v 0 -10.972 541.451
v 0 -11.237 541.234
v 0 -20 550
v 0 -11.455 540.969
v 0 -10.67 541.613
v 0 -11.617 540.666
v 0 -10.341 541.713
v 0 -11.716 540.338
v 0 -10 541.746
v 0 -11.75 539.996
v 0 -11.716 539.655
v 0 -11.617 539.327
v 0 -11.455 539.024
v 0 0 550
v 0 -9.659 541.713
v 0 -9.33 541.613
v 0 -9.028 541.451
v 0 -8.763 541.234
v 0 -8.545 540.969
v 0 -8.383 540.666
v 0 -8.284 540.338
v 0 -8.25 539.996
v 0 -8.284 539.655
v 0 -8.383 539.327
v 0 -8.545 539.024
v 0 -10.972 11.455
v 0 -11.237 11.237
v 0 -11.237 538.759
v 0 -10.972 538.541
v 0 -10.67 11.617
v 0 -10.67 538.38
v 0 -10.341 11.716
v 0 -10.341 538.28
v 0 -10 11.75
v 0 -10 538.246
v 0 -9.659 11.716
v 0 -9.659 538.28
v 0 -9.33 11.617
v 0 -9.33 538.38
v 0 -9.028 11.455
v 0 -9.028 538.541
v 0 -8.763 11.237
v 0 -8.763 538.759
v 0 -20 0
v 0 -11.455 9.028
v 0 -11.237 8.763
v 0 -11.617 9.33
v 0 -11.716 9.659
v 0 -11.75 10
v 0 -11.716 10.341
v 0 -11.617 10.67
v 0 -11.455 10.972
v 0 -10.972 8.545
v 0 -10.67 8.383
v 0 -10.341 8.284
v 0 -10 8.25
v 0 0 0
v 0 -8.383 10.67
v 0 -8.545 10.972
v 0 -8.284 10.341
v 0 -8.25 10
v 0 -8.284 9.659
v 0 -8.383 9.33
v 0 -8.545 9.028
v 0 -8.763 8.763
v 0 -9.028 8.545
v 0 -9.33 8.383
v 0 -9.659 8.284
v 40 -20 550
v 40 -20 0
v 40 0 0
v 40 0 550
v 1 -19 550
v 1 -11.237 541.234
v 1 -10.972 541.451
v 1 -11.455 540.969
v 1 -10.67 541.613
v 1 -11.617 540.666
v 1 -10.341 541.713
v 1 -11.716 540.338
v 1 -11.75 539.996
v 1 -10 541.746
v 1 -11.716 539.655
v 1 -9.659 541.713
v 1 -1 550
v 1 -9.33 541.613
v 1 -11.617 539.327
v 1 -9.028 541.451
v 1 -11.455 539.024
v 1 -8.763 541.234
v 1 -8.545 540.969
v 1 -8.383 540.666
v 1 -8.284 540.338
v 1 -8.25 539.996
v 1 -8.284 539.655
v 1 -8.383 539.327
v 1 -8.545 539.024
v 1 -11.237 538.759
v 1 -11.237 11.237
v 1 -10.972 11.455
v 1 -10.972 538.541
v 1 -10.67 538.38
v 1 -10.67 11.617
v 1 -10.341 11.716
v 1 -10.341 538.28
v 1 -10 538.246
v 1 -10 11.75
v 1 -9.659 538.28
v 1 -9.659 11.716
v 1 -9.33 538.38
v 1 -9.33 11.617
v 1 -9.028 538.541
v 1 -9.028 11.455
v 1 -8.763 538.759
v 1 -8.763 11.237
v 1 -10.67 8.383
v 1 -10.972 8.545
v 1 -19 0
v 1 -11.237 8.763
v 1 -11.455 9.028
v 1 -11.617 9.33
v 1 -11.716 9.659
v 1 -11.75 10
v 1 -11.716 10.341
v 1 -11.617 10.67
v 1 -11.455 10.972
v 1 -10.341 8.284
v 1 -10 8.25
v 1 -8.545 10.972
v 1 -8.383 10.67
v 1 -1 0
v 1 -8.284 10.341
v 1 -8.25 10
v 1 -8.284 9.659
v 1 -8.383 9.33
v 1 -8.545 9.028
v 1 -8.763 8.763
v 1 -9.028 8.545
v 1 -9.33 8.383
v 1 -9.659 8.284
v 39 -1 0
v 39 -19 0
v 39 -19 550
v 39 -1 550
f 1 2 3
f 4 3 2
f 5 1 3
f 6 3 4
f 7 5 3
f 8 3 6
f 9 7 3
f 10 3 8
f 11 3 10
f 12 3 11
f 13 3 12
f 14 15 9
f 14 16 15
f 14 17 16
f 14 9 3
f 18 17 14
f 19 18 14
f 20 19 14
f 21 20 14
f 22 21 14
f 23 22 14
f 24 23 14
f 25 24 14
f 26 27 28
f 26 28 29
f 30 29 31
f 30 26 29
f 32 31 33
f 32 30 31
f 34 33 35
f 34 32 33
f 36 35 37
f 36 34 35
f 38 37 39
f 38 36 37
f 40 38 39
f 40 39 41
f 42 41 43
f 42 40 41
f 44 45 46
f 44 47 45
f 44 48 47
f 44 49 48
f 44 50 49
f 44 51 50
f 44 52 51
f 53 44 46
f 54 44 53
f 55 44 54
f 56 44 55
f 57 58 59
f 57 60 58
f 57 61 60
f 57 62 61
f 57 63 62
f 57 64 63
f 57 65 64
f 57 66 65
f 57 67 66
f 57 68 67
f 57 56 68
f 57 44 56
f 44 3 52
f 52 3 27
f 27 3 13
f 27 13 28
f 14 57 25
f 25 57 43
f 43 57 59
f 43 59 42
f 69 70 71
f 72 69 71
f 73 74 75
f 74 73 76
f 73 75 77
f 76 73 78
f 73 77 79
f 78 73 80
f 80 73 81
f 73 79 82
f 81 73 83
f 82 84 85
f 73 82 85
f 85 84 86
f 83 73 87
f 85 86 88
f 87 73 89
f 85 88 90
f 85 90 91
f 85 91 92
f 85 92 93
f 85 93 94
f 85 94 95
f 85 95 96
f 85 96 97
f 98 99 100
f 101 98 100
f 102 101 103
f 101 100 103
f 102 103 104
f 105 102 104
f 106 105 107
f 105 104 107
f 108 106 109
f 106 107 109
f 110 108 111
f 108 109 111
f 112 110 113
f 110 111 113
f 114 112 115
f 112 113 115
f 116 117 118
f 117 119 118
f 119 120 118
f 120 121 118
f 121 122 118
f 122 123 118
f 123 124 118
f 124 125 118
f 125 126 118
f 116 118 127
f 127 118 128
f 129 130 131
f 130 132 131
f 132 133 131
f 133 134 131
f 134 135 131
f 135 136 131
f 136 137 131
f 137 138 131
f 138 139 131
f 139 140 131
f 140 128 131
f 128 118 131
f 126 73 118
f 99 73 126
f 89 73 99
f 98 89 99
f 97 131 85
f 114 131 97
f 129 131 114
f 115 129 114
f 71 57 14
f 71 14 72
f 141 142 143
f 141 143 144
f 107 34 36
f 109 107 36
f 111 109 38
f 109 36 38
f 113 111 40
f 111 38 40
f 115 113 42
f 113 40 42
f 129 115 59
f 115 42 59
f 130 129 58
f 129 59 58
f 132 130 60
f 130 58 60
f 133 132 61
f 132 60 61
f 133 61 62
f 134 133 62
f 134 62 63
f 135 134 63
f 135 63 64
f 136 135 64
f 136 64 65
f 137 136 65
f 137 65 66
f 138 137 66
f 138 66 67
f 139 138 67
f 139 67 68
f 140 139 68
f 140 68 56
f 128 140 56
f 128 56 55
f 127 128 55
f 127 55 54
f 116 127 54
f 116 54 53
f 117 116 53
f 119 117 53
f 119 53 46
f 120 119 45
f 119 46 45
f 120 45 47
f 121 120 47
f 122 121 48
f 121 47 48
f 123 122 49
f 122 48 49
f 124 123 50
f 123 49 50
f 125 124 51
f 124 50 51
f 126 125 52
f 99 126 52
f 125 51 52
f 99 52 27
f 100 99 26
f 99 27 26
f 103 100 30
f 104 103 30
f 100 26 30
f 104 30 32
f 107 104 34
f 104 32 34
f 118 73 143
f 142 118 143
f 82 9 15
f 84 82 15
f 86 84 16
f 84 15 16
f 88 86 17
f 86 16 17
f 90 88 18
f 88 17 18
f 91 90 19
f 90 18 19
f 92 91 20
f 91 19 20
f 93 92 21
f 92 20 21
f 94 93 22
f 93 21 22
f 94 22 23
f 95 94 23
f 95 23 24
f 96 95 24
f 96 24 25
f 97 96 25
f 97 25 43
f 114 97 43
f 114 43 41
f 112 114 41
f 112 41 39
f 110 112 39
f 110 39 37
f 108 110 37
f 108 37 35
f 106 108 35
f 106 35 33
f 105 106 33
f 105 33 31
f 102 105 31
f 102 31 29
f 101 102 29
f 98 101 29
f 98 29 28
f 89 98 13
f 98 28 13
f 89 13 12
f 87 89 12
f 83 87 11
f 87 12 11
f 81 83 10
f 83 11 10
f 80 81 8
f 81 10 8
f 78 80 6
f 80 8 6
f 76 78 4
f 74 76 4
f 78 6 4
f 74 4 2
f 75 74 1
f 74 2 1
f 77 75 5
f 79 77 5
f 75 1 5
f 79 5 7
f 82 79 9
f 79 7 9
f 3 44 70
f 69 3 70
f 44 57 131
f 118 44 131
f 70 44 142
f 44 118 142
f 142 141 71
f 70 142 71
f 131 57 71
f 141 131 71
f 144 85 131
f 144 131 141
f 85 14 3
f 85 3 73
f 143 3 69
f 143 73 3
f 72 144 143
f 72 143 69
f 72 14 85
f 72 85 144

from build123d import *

# Parameters (mm, degrees)
SKETCH_1_W          = 40
SKETCH_1_H          = 20
SKETCH_1_W_2        = 38
SKETCH_1_H_2        = 18
EXTRUDE_1_DEPTH     = 550
SKETCH_4_R          = 1.75
CUT_EXTRUDE_2_DEPTH = 1.5


with BuildPart() as part:
    # 草图1 → 拉伸-薄壁1 (new body)
    with BuildSketch(Plane.XY):
        with Locations((20, -10)):
            Rectangle(SKETCH_1_W, SKETCH_1_H)
        with Locations((20, -10)):
            Rectangle(SKETCH_1_W_2, SKETCH_1_H_2, mode=Mode.SUBTRACT)
    extrude(amount=EXTRUDE_1_DEPTH)

    # 草图4 → 切除-拉伸2 (cut)
    with BuildSketch(Plane.ZY):
        with Locations((539.996387591, -10)):
            Circle(SKETCH_4_R)
        with Locations((10, -10.000000002)):
            Circle(SKETCH_4_R)
    extrude(amount=-CUT_EXTRUDE_2_DEPTH, mode=Mode.SUBTRACT)


solid = part.part
